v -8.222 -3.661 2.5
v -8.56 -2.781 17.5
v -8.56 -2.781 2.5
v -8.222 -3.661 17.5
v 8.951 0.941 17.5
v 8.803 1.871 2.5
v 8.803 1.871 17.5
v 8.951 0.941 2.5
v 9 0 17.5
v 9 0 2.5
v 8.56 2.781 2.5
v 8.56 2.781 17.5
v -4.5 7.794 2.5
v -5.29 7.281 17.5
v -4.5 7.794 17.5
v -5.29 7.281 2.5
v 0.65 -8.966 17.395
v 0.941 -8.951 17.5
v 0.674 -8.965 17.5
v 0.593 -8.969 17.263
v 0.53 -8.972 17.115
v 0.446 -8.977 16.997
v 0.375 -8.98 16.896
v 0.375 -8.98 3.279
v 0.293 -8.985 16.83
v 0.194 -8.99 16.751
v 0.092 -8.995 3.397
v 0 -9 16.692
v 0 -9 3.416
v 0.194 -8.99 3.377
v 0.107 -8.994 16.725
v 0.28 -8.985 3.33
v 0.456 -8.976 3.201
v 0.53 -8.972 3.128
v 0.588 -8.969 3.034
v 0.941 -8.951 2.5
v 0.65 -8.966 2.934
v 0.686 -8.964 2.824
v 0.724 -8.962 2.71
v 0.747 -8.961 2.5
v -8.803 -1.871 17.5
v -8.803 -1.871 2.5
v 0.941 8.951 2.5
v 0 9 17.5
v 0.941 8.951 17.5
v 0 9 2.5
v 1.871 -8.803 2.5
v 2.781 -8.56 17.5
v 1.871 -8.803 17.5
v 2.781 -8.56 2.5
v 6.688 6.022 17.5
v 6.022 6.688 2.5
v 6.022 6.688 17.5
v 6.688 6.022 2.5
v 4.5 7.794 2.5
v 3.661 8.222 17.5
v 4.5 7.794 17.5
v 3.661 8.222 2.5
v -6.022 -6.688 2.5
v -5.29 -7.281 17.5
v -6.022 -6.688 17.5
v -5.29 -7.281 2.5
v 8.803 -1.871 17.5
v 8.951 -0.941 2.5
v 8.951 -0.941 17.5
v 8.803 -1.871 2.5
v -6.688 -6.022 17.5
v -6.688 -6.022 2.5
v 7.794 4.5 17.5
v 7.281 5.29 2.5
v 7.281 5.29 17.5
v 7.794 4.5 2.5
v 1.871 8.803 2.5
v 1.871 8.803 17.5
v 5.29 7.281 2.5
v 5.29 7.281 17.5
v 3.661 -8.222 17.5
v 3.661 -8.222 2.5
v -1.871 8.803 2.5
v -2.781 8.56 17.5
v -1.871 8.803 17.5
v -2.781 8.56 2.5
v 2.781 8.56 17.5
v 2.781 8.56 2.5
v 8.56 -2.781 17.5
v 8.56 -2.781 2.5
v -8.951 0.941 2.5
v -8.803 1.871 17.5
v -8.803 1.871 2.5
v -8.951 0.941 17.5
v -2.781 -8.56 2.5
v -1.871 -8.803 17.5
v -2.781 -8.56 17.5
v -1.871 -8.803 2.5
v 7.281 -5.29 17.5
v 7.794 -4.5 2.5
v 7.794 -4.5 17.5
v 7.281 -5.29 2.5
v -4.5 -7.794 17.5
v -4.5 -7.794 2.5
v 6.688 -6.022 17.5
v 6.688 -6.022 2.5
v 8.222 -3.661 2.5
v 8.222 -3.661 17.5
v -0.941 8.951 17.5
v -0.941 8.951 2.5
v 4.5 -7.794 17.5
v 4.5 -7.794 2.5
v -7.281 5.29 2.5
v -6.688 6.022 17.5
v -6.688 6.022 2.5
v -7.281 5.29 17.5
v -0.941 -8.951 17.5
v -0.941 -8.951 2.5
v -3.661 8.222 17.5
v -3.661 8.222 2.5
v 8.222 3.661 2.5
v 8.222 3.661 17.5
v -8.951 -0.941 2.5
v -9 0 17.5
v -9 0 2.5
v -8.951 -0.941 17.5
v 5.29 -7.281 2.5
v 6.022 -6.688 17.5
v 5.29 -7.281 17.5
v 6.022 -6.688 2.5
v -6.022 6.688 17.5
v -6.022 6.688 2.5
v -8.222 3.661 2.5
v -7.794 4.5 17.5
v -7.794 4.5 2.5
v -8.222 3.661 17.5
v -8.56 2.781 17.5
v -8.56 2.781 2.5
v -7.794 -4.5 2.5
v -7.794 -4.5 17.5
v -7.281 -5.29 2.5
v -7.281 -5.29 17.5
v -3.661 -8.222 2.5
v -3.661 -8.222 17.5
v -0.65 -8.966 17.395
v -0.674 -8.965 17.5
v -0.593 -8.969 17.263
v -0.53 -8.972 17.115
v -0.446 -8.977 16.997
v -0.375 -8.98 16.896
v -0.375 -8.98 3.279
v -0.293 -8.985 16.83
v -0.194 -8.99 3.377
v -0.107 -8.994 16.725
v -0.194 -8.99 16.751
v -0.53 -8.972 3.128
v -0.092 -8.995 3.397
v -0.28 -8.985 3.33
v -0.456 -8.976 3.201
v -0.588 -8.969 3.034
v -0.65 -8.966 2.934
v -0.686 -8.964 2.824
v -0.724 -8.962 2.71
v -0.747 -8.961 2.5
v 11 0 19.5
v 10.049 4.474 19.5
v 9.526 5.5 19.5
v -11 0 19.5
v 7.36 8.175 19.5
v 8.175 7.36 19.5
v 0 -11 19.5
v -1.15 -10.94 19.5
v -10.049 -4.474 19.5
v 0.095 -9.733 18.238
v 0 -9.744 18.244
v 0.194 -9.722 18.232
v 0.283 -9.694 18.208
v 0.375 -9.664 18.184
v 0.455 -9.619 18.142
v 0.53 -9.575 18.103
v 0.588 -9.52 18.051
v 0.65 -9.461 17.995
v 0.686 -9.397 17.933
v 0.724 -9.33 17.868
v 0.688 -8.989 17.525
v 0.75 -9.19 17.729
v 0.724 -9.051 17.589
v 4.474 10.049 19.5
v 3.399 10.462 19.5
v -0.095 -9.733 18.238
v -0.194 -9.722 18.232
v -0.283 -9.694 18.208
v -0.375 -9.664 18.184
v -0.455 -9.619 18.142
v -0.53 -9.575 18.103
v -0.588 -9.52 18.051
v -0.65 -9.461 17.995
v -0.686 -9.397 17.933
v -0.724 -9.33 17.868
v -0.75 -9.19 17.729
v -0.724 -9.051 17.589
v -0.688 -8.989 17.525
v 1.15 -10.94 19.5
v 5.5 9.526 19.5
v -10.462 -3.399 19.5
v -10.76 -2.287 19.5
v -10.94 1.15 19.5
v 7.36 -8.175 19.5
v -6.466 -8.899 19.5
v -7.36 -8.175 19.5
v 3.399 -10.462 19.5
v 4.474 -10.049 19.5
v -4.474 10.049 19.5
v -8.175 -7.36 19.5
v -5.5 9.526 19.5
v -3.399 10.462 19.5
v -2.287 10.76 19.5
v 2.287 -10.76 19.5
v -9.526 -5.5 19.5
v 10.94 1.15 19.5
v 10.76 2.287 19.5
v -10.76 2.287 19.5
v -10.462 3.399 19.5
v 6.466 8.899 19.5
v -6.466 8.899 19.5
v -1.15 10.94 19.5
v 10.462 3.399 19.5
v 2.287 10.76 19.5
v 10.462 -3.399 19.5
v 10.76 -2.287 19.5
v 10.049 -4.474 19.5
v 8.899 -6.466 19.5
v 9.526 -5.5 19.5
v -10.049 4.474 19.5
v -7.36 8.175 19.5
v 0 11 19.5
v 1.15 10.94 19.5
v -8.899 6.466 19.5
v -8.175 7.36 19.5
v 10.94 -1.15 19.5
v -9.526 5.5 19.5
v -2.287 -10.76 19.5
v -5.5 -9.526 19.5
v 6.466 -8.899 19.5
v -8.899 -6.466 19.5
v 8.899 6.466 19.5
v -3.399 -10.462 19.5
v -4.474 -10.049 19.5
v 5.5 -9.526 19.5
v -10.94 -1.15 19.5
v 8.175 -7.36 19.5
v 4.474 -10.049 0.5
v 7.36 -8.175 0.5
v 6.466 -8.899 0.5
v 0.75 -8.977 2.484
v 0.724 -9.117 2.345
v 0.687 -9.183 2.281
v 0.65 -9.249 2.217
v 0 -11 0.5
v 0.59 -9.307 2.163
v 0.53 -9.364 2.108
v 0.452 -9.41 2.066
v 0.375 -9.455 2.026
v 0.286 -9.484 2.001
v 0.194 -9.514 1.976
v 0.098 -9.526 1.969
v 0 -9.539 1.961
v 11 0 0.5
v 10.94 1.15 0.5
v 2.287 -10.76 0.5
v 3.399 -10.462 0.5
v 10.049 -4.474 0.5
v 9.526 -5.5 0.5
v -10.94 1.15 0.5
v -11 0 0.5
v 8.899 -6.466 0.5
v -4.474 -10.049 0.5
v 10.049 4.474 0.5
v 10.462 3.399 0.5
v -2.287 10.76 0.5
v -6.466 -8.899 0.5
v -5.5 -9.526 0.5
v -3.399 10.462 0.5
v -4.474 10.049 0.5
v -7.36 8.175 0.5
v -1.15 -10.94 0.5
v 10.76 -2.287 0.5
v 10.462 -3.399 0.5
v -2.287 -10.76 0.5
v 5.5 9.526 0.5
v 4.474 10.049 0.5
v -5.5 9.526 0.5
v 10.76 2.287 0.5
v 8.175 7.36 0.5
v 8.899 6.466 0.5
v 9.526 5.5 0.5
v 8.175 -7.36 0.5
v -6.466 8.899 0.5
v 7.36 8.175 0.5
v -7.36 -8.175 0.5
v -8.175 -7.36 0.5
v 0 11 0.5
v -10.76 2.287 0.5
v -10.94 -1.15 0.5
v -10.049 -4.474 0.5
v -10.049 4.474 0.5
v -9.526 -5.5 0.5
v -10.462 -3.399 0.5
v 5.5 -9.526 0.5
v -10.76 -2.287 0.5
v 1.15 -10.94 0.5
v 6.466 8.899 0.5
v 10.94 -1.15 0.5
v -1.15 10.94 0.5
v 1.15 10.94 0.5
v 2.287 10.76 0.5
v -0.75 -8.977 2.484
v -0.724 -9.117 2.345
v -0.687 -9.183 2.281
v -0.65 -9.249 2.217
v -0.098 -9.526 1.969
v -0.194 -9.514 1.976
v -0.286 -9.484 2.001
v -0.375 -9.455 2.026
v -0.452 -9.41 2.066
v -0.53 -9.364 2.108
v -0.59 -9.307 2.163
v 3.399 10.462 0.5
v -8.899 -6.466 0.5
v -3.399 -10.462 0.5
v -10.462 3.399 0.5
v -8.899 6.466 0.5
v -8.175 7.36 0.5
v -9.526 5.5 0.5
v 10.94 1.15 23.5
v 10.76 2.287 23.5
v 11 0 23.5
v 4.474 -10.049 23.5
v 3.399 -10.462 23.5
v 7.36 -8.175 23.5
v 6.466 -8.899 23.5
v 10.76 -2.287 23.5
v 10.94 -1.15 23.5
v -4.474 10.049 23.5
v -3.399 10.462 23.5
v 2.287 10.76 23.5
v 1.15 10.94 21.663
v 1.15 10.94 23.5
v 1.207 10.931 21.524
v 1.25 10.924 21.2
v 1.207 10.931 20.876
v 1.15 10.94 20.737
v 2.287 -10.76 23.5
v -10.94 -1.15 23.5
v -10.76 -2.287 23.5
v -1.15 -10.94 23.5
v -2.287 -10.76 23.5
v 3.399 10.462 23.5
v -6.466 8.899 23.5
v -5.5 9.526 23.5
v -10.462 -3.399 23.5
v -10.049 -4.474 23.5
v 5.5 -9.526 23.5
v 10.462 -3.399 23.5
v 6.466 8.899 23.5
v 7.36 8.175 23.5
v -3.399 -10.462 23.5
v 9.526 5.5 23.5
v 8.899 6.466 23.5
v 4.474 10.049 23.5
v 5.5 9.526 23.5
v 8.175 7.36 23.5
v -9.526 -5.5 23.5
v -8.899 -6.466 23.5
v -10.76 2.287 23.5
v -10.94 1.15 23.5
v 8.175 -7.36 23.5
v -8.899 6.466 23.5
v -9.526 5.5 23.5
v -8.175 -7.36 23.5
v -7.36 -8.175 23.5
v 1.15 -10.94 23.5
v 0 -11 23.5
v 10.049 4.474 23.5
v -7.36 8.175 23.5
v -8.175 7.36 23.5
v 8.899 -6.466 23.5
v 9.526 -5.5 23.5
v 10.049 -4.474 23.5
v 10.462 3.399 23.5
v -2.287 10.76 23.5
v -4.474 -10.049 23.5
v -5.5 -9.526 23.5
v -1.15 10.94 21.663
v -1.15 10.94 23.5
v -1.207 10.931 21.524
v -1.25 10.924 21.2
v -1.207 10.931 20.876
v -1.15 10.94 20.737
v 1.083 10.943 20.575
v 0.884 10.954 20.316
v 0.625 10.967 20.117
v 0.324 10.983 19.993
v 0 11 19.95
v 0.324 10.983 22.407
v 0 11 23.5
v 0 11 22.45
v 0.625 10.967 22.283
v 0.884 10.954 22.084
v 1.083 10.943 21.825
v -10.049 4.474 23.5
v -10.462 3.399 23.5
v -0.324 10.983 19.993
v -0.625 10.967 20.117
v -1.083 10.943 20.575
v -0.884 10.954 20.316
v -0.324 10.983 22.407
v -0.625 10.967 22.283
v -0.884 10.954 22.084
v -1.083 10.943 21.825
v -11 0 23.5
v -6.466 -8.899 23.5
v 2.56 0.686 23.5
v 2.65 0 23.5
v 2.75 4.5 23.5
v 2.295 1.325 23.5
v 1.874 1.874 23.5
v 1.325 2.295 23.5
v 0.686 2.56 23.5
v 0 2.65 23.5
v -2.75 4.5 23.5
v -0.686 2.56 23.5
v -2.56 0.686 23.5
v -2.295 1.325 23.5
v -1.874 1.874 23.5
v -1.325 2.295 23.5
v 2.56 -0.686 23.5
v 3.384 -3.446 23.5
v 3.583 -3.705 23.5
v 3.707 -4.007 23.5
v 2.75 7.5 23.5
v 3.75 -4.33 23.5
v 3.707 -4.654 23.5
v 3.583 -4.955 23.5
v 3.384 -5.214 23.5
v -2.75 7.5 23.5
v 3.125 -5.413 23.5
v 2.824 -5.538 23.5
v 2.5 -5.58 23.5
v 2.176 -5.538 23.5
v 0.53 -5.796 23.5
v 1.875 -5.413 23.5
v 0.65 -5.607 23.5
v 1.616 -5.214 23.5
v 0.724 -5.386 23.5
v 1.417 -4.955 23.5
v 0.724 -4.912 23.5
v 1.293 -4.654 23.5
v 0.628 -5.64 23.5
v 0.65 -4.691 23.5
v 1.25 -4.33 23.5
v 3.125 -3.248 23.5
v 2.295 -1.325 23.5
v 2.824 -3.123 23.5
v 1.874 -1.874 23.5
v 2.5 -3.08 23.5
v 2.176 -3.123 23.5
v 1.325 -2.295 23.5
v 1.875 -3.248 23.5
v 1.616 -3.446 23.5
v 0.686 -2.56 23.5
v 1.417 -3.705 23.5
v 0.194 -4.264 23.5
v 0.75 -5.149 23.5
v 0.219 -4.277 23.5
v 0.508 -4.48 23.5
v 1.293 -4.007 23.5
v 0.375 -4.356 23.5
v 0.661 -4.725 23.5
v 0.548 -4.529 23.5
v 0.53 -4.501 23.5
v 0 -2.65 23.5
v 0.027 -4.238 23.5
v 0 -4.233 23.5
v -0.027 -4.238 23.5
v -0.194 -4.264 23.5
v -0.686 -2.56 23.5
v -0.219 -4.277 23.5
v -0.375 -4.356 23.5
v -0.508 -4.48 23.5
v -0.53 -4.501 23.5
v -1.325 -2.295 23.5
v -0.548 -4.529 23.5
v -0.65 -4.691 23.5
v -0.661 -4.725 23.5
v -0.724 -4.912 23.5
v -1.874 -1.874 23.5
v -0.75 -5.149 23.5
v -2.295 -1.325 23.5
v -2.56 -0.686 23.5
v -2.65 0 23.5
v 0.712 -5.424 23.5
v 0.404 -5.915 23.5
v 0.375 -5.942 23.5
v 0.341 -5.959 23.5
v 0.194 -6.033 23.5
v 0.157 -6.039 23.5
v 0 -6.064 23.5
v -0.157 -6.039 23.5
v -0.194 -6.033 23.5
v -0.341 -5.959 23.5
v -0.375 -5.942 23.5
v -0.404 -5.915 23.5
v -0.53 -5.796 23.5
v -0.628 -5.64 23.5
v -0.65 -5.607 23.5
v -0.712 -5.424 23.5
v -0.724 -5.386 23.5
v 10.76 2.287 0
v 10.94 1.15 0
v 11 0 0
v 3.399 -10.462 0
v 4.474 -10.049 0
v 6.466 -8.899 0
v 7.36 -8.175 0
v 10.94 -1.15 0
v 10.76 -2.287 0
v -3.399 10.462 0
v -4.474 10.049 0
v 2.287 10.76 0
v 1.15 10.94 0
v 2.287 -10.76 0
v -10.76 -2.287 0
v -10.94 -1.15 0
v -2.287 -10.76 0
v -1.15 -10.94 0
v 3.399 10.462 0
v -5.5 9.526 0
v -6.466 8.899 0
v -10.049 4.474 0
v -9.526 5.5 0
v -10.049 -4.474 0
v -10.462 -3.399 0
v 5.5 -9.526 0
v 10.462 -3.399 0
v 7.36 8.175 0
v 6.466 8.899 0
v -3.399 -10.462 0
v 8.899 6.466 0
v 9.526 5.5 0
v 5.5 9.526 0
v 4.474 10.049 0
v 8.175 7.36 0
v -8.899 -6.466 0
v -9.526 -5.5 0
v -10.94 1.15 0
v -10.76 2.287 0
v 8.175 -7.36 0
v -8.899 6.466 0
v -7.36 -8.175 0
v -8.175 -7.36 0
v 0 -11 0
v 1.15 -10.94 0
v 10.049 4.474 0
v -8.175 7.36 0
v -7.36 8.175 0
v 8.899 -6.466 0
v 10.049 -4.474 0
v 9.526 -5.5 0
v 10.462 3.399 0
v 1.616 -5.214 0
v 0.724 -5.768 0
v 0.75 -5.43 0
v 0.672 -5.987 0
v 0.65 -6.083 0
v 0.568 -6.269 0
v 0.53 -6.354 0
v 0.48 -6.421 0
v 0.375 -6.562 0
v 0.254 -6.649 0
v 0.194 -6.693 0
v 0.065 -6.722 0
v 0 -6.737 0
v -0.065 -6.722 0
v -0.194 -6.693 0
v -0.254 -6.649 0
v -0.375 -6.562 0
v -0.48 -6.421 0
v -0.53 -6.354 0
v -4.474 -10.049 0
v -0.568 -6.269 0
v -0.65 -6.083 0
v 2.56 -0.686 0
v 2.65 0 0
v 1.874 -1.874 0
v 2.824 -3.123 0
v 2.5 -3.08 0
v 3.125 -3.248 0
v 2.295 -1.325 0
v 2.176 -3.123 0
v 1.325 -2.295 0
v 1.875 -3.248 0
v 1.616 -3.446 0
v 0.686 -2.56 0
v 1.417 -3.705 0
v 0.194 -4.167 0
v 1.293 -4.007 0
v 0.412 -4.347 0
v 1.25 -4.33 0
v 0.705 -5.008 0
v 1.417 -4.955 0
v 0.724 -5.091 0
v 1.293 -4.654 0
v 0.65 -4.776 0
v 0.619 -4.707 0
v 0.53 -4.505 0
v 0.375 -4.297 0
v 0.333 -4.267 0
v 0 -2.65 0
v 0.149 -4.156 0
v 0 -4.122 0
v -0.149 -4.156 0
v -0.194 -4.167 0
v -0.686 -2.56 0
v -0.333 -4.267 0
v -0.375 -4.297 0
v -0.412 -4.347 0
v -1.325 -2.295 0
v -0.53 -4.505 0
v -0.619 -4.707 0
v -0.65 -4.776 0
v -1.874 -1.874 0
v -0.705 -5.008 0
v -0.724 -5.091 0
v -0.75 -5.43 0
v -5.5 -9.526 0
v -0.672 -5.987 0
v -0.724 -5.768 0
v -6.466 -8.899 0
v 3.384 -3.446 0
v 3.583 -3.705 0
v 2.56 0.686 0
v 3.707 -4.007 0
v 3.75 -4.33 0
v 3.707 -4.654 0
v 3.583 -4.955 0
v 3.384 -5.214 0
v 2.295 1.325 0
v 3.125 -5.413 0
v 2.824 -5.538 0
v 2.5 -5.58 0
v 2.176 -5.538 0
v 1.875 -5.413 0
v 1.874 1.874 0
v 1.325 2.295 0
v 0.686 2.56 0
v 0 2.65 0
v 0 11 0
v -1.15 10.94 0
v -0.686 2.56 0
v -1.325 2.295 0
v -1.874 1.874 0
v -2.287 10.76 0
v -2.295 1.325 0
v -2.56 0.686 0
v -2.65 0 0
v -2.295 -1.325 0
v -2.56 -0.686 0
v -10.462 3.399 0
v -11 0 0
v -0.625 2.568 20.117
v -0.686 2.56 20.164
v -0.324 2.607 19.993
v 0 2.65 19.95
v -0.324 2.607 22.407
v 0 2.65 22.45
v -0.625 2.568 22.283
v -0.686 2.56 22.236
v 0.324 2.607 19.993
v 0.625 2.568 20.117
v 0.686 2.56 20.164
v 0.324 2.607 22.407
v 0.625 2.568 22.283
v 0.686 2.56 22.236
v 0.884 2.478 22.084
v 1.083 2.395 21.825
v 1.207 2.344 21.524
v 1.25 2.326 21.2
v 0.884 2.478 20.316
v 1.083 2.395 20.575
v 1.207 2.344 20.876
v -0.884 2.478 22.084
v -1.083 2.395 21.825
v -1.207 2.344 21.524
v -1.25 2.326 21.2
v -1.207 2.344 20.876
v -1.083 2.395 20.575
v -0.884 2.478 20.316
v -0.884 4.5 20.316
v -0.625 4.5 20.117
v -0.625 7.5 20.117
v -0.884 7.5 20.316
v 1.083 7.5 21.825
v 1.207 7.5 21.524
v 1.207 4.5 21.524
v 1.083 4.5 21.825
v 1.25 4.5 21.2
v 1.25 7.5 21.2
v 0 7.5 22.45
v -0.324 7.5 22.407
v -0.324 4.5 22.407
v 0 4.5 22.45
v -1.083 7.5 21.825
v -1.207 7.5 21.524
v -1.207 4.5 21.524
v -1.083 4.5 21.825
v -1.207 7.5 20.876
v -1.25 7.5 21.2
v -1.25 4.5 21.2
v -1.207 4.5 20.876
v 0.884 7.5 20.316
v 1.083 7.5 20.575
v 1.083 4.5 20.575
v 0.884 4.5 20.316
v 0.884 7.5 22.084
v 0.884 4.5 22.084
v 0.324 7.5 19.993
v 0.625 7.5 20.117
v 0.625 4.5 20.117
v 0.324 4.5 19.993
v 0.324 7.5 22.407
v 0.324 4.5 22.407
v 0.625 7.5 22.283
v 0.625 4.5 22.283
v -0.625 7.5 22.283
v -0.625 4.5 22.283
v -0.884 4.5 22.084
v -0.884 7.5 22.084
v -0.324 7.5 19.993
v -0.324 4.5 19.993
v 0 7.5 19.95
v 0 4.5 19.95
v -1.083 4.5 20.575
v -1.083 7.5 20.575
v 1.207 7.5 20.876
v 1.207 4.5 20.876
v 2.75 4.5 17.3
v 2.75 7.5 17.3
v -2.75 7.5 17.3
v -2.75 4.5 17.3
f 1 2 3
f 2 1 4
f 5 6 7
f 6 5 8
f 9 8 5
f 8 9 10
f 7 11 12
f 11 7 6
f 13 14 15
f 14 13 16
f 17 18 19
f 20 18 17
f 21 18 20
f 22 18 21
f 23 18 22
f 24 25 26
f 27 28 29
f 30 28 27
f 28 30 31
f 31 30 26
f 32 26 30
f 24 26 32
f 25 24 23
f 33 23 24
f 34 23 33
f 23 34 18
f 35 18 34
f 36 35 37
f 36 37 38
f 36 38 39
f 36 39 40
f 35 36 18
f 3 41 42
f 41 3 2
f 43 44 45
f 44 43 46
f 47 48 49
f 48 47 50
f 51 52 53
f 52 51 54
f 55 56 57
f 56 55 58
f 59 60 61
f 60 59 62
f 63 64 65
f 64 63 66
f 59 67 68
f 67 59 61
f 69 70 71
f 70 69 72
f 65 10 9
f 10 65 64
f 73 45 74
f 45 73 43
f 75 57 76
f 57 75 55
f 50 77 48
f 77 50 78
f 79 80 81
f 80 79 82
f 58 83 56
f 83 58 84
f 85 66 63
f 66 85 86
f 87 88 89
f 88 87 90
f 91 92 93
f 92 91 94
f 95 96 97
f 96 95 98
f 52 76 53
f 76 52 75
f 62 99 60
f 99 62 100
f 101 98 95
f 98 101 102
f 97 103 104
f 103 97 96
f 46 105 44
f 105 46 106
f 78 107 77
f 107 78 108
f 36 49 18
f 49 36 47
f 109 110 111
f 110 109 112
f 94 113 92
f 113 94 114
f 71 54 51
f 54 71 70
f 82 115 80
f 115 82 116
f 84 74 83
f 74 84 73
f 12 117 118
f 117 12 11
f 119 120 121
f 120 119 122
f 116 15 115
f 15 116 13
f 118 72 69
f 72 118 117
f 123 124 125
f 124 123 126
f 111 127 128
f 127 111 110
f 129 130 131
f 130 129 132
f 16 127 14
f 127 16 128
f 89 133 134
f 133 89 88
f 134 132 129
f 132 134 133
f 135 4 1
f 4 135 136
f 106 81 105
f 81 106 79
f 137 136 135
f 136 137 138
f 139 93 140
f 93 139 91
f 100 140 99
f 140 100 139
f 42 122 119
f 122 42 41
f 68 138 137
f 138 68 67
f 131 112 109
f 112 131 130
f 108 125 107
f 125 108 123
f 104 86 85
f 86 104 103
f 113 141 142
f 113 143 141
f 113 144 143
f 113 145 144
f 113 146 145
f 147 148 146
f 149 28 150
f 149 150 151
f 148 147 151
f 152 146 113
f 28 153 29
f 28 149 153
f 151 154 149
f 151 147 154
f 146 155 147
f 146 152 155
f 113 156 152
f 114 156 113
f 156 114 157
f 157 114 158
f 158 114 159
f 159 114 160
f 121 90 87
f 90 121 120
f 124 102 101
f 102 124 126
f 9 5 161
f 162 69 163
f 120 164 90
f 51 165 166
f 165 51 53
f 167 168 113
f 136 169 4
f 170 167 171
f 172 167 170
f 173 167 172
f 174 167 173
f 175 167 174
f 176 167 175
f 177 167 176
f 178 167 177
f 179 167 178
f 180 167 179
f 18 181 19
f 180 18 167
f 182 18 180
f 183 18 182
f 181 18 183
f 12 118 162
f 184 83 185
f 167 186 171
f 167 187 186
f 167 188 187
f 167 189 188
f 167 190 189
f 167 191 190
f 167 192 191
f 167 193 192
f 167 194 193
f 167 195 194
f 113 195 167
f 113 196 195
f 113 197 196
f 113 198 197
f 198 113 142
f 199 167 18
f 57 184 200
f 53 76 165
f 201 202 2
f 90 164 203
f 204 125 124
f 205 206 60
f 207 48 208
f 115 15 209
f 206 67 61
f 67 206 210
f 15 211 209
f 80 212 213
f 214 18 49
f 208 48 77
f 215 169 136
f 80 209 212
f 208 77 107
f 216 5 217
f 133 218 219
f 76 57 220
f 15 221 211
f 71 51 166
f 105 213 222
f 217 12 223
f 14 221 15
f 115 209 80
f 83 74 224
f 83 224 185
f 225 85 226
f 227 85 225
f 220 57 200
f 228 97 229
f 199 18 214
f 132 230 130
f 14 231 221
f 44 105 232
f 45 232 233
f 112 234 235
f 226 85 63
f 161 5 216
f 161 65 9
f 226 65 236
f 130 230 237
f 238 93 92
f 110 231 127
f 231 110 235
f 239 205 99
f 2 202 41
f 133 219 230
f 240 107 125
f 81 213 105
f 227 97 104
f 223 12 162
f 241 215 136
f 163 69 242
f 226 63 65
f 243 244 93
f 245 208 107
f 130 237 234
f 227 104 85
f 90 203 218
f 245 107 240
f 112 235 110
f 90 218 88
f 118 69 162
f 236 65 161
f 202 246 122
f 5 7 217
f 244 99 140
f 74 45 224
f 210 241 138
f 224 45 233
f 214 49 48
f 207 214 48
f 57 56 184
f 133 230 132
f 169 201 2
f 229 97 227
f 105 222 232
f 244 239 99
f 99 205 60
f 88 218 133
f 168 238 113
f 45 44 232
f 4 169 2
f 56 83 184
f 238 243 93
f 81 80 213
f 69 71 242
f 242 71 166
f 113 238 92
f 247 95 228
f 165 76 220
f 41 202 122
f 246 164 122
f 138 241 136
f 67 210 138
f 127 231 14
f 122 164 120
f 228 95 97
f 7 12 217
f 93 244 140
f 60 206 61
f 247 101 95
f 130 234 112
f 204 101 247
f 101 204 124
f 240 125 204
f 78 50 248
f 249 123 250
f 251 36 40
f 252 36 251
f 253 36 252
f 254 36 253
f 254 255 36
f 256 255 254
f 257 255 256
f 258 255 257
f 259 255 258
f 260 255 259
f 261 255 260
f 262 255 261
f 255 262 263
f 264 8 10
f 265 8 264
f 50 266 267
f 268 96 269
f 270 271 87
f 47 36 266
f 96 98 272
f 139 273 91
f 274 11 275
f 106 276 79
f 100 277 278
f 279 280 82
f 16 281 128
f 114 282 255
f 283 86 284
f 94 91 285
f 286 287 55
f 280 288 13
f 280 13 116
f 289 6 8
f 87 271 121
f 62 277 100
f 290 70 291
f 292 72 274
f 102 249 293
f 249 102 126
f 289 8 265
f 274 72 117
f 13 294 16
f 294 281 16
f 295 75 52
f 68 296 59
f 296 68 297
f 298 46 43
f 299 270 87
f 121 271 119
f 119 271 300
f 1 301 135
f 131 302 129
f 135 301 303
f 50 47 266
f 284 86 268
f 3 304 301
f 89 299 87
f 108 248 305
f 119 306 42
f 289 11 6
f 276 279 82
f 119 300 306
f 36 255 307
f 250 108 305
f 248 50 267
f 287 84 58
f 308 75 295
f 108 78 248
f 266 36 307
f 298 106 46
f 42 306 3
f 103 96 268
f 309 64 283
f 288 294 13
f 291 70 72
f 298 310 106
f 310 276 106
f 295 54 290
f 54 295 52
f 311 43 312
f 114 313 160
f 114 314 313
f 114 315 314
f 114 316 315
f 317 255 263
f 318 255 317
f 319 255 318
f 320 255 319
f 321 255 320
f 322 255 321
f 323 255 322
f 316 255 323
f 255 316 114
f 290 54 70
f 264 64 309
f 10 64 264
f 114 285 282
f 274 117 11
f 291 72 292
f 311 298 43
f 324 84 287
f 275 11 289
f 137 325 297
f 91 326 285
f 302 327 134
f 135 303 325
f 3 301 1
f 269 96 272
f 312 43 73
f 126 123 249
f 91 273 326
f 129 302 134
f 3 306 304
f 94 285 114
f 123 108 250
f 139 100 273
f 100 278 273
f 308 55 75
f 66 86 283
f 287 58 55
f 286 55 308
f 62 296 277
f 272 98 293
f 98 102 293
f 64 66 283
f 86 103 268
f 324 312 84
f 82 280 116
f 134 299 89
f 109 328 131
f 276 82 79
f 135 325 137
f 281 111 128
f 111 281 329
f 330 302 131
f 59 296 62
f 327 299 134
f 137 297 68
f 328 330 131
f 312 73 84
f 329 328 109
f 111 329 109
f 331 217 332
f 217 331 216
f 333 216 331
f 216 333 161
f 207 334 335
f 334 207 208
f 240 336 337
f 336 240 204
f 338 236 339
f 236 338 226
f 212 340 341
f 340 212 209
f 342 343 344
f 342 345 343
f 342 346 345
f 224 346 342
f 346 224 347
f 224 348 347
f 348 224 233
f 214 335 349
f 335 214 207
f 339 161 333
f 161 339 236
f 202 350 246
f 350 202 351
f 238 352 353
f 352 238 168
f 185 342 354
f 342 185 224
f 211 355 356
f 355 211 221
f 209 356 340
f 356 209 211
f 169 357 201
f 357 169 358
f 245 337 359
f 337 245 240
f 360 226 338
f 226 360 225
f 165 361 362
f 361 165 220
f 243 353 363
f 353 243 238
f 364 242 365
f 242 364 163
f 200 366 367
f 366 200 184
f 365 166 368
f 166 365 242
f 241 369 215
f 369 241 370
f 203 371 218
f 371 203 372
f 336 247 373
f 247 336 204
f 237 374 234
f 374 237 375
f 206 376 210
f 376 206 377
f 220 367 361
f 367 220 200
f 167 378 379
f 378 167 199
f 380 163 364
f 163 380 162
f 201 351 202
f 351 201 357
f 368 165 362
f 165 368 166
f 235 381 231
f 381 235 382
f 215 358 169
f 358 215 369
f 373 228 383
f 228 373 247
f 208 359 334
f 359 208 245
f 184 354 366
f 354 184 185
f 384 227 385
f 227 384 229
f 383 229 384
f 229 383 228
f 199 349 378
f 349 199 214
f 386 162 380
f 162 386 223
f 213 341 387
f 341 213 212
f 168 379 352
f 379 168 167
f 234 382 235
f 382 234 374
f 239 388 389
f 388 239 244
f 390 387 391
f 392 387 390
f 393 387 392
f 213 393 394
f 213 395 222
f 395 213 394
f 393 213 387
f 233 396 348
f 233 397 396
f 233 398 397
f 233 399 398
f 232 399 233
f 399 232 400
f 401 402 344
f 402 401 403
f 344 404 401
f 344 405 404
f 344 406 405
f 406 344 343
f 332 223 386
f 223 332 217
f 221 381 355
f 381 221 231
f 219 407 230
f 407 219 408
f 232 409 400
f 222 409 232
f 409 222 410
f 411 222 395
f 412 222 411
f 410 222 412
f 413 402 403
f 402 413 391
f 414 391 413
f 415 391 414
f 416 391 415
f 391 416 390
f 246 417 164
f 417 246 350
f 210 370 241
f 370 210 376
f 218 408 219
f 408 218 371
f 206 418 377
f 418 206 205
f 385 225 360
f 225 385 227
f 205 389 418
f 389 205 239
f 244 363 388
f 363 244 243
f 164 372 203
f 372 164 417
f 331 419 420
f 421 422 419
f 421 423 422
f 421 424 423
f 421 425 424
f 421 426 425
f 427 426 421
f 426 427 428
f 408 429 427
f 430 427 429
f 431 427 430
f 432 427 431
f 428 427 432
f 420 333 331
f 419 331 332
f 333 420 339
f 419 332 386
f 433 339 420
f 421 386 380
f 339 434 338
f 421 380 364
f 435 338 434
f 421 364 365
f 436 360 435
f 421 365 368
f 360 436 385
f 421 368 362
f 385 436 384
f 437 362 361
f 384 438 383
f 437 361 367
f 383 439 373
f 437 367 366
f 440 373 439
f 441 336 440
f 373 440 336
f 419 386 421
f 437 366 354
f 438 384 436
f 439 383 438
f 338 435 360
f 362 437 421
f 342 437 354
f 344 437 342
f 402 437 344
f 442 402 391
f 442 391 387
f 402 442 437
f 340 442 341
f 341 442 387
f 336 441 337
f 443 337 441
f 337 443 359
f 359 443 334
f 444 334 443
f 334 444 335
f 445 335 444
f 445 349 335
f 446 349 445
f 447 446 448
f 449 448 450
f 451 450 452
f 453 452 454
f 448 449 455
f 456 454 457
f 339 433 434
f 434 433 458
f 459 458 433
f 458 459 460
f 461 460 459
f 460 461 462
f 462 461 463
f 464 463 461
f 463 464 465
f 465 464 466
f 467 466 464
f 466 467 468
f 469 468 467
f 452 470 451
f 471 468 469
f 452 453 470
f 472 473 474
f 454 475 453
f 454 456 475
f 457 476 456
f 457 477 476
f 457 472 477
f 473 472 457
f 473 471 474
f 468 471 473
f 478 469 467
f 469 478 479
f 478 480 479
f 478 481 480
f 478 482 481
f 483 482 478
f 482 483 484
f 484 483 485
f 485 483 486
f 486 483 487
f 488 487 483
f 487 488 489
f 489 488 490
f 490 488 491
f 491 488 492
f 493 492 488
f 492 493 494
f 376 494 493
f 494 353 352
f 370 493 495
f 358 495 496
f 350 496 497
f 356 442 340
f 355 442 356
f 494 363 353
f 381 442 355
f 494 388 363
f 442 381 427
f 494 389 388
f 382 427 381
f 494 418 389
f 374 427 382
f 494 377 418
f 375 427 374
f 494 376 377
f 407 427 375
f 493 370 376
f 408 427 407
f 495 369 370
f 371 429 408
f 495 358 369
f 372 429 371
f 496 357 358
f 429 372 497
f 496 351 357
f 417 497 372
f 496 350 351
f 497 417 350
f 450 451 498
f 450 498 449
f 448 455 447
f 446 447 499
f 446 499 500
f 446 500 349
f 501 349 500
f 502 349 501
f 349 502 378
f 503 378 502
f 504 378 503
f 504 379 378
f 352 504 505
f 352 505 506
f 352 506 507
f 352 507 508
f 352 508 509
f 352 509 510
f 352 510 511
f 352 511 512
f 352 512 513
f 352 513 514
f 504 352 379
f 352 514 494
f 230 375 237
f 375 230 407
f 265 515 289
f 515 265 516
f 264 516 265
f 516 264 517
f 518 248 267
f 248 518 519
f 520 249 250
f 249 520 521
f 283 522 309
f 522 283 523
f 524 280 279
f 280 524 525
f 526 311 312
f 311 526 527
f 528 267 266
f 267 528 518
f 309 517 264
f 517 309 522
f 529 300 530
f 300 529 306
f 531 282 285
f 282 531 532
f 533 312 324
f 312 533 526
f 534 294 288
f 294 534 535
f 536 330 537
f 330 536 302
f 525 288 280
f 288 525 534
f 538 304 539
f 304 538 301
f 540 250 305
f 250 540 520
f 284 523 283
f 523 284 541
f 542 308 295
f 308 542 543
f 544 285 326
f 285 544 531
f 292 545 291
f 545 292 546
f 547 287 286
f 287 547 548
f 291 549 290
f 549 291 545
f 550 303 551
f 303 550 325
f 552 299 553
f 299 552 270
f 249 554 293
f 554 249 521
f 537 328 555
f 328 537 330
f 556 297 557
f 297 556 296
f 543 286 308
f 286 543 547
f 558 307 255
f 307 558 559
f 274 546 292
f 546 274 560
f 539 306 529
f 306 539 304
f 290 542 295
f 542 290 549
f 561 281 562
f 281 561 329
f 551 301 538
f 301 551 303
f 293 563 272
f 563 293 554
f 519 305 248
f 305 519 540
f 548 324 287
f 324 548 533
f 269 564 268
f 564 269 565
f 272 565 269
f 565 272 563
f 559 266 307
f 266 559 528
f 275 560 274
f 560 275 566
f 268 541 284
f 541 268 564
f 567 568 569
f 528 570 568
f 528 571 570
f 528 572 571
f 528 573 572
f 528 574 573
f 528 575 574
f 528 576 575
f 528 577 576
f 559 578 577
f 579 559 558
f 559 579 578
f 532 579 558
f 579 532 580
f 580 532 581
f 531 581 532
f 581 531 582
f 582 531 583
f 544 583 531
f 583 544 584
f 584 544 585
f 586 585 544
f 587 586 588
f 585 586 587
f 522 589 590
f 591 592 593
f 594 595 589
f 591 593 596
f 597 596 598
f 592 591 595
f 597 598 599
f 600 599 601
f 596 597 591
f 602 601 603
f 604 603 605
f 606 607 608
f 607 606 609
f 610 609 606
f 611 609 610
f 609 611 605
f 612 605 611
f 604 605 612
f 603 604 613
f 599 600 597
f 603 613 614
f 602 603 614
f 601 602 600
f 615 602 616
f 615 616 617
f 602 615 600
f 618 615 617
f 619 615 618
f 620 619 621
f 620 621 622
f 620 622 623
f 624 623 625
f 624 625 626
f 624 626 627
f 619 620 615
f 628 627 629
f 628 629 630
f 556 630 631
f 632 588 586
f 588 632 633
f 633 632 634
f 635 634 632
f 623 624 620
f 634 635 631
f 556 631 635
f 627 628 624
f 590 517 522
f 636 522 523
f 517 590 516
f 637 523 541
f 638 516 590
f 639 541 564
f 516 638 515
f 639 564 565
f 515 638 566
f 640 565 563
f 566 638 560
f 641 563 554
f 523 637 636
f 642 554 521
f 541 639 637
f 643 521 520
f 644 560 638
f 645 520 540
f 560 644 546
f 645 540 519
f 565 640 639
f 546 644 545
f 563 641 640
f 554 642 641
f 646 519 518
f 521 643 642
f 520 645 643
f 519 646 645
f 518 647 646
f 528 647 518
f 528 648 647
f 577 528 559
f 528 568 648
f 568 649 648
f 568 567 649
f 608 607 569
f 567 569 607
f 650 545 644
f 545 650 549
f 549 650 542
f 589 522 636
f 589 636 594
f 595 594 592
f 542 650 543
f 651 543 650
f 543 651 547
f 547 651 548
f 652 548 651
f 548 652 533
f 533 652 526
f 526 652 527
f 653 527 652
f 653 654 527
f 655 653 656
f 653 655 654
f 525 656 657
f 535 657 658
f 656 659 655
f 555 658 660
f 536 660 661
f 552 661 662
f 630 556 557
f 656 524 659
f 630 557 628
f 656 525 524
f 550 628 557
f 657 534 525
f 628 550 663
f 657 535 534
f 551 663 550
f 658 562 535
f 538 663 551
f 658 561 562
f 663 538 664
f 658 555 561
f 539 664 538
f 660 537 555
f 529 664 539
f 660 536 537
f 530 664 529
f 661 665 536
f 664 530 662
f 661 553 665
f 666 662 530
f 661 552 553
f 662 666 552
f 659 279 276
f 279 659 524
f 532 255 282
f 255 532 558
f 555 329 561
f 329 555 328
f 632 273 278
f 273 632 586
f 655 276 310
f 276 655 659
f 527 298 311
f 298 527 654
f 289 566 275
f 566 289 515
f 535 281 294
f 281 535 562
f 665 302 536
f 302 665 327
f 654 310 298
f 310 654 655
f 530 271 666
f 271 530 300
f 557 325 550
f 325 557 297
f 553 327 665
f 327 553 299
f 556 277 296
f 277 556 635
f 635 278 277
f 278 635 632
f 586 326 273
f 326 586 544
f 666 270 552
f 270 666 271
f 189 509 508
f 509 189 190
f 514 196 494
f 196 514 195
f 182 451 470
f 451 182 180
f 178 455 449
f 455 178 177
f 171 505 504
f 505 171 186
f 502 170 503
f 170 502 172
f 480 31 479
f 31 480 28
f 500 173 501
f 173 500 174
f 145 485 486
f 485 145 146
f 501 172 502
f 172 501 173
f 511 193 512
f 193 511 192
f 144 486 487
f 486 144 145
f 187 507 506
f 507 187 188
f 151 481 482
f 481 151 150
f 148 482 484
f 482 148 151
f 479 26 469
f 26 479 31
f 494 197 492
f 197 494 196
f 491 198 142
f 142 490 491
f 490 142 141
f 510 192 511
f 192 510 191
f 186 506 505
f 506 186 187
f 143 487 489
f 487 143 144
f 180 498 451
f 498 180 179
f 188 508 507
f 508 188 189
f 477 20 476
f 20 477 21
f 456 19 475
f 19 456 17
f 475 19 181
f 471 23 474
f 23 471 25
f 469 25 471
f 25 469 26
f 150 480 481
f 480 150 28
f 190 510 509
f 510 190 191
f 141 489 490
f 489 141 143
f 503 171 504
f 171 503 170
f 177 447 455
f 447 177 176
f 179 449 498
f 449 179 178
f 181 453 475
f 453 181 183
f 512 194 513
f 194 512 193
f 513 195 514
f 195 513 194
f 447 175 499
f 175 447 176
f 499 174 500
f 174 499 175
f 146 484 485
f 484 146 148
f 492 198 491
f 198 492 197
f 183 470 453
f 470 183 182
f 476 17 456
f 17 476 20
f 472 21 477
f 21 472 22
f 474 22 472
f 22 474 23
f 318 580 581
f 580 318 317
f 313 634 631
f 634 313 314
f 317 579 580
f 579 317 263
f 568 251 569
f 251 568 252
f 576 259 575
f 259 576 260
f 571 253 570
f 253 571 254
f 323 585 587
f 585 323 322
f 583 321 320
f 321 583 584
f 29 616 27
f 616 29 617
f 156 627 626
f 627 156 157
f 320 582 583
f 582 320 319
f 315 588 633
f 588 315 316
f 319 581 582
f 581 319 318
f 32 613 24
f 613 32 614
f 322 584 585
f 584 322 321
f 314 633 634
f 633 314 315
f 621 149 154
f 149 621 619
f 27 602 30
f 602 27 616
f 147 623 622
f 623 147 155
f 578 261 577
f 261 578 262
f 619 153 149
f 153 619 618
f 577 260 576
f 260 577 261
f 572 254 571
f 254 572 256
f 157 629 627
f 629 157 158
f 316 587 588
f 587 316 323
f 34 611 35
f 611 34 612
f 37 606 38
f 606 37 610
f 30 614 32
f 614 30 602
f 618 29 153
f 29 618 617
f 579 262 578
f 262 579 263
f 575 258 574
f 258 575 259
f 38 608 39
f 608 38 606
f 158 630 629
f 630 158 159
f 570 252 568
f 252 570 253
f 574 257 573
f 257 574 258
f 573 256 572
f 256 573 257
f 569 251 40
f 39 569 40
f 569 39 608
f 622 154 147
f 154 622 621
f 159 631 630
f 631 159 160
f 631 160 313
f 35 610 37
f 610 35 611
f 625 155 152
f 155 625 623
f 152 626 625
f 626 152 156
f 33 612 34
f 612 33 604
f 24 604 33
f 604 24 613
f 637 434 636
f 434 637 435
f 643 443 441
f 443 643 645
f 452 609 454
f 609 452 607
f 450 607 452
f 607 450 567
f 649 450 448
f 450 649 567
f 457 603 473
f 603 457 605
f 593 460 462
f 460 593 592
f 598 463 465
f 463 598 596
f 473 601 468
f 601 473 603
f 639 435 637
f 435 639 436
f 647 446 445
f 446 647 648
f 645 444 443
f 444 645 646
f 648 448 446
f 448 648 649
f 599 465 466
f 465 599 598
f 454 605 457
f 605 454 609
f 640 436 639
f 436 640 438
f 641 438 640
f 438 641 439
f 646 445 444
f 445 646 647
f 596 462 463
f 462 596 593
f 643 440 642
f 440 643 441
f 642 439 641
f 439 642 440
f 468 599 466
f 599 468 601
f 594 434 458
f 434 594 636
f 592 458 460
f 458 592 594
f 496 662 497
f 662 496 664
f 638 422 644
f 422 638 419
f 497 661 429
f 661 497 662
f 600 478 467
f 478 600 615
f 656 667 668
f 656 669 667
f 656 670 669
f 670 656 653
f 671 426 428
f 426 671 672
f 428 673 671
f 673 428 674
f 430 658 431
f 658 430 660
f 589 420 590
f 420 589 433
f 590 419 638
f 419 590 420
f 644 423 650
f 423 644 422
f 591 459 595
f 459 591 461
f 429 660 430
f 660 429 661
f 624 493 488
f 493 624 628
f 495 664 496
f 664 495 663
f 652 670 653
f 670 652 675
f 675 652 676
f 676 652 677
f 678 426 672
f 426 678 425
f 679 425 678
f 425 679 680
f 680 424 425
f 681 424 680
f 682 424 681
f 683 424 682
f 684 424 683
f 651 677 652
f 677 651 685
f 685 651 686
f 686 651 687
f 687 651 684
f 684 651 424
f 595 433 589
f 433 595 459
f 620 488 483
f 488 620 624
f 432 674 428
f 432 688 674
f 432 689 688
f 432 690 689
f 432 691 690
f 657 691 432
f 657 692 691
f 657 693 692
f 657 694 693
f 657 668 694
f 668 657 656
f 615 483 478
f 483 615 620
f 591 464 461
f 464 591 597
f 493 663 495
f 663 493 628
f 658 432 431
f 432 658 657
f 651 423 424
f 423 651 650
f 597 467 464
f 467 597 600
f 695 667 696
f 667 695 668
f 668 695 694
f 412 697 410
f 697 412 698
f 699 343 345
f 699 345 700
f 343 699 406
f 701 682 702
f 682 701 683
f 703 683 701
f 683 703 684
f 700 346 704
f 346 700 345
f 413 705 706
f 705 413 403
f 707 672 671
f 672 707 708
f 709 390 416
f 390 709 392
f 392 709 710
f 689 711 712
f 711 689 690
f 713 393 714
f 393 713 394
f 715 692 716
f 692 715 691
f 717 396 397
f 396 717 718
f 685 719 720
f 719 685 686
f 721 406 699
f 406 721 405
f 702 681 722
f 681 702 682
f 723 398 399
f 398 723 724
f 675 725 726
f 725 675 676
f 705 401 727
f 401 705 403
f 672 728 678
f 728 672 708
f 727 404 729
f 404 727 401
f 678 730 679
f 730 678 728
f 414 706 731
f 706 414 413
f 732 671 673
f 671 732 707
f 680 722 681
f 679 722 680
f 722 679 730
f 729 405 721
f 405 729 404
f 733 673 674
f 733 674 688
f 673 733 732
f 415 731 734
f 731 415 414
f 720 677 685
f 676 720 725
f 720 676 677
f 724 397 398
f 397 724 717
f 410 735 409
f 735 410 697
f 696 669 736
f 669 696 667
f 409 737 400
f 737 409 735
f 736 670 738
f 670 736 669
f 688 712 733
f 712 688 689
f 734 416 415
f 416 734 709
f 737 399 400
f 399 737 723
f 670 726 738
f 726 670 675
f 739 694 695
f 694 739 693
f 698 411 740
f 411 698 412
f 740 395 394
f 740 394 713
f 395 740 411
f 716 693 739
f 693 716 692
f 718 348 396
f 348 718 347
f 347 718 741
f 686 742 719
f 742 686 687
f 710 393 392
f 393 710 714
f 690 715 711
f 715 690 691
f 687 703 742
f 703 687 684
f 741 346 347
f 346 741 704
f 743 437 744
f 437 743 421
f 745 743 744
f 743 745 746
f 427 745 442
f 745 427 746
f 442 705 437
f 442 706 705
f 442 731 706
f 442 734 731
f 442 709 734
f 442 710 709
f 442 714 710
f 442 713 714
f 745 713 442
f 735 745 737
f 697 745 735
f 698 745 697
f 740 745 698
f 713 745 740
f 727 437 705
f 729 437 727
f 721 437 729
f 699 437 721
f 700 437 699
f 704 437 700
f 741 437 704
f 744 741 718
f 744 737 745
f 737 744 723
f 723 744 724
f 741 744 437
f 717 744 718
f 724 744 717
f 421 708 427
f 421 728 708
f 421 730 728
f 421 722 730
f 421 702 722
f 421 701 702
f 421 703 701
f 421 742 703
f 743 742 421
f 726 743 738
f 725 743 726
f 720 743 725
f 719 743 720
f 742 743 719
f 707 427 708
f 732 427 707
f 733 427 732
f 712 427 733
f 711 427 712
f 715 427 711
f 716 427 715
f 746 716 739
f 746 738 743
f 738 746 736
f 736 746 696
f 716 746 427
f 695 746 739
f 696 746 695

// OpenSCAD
radius = 9;
width = 17;
top = 4;
smoothness = 60;

captive_nut_d = 6.2;
captive_nut_ff = 5.4+0.1;
captive_nut_h = 3;

module spool() {

	difference() {
		union() {
			cylinder(r=radius, h=width, center=true, $fn=smoothness);
			translate([0, 0, width/2+0.5])
			cylinder(r1=radius, r2=radius+2, h=2, center=true, $fn=smoothness);
			translate([0, 0, -width/2+.5])
			cylinder(r2=radius, r1=radius+2, h=2, center=true, $fn=smoothness);
			translate([0, 0, width/2+top/2+1.5])
			cylinder(r=radius+2, h=top, center=true, $fn=smoothness);
			translate([0, 0, -width/2-.75])
			cylinder(r=radius+2, h=0.5, center=true, $fn=smoothness);
		}

		// Motor shaft.
		cylinder(r=(5+0.3)/2, h=50, center=true, $fn=24);

		// Filament tunnels.
		rotate([0,0,180]) {
			translate([0, radius, width/2]) rotate([35, 0, 0])
			cylinder(r=.75, h=20, center=true, $fn=24);
			translate([0, radius, -width/2+1.5]) rotate([-55, 0, 0])
			cylinder(r=.75, h=20, center=true, $fn=24);
			rotate([0,0,30])
			translate([0, 5, 0])
			cylinder(r=1.25, h=40, center=true, $fn=24); }

		// grub screw
		translate([0, 5.5, width/2+3.2]) rotate([90, 0, 0]) {
			cylinder(r=1.25, h=radius+5, center=true, $fn=24);
		}
		// nut trap
		translate([-captive_nut_ff/2,radius/2,width/2+top+1.5-captive_nut_d]){
			cube([captive_nut_ff, captive_nut_h, captive_nut_d]);
		}
		// cutout to insert captive nut
		translate([-captive_nut_ff/2,radius/2,width/2+top]) cube([captive_nut_ff, captive_nut_h, 2]);

	}
}

translate([0, 0, width/2+1]) spool();
